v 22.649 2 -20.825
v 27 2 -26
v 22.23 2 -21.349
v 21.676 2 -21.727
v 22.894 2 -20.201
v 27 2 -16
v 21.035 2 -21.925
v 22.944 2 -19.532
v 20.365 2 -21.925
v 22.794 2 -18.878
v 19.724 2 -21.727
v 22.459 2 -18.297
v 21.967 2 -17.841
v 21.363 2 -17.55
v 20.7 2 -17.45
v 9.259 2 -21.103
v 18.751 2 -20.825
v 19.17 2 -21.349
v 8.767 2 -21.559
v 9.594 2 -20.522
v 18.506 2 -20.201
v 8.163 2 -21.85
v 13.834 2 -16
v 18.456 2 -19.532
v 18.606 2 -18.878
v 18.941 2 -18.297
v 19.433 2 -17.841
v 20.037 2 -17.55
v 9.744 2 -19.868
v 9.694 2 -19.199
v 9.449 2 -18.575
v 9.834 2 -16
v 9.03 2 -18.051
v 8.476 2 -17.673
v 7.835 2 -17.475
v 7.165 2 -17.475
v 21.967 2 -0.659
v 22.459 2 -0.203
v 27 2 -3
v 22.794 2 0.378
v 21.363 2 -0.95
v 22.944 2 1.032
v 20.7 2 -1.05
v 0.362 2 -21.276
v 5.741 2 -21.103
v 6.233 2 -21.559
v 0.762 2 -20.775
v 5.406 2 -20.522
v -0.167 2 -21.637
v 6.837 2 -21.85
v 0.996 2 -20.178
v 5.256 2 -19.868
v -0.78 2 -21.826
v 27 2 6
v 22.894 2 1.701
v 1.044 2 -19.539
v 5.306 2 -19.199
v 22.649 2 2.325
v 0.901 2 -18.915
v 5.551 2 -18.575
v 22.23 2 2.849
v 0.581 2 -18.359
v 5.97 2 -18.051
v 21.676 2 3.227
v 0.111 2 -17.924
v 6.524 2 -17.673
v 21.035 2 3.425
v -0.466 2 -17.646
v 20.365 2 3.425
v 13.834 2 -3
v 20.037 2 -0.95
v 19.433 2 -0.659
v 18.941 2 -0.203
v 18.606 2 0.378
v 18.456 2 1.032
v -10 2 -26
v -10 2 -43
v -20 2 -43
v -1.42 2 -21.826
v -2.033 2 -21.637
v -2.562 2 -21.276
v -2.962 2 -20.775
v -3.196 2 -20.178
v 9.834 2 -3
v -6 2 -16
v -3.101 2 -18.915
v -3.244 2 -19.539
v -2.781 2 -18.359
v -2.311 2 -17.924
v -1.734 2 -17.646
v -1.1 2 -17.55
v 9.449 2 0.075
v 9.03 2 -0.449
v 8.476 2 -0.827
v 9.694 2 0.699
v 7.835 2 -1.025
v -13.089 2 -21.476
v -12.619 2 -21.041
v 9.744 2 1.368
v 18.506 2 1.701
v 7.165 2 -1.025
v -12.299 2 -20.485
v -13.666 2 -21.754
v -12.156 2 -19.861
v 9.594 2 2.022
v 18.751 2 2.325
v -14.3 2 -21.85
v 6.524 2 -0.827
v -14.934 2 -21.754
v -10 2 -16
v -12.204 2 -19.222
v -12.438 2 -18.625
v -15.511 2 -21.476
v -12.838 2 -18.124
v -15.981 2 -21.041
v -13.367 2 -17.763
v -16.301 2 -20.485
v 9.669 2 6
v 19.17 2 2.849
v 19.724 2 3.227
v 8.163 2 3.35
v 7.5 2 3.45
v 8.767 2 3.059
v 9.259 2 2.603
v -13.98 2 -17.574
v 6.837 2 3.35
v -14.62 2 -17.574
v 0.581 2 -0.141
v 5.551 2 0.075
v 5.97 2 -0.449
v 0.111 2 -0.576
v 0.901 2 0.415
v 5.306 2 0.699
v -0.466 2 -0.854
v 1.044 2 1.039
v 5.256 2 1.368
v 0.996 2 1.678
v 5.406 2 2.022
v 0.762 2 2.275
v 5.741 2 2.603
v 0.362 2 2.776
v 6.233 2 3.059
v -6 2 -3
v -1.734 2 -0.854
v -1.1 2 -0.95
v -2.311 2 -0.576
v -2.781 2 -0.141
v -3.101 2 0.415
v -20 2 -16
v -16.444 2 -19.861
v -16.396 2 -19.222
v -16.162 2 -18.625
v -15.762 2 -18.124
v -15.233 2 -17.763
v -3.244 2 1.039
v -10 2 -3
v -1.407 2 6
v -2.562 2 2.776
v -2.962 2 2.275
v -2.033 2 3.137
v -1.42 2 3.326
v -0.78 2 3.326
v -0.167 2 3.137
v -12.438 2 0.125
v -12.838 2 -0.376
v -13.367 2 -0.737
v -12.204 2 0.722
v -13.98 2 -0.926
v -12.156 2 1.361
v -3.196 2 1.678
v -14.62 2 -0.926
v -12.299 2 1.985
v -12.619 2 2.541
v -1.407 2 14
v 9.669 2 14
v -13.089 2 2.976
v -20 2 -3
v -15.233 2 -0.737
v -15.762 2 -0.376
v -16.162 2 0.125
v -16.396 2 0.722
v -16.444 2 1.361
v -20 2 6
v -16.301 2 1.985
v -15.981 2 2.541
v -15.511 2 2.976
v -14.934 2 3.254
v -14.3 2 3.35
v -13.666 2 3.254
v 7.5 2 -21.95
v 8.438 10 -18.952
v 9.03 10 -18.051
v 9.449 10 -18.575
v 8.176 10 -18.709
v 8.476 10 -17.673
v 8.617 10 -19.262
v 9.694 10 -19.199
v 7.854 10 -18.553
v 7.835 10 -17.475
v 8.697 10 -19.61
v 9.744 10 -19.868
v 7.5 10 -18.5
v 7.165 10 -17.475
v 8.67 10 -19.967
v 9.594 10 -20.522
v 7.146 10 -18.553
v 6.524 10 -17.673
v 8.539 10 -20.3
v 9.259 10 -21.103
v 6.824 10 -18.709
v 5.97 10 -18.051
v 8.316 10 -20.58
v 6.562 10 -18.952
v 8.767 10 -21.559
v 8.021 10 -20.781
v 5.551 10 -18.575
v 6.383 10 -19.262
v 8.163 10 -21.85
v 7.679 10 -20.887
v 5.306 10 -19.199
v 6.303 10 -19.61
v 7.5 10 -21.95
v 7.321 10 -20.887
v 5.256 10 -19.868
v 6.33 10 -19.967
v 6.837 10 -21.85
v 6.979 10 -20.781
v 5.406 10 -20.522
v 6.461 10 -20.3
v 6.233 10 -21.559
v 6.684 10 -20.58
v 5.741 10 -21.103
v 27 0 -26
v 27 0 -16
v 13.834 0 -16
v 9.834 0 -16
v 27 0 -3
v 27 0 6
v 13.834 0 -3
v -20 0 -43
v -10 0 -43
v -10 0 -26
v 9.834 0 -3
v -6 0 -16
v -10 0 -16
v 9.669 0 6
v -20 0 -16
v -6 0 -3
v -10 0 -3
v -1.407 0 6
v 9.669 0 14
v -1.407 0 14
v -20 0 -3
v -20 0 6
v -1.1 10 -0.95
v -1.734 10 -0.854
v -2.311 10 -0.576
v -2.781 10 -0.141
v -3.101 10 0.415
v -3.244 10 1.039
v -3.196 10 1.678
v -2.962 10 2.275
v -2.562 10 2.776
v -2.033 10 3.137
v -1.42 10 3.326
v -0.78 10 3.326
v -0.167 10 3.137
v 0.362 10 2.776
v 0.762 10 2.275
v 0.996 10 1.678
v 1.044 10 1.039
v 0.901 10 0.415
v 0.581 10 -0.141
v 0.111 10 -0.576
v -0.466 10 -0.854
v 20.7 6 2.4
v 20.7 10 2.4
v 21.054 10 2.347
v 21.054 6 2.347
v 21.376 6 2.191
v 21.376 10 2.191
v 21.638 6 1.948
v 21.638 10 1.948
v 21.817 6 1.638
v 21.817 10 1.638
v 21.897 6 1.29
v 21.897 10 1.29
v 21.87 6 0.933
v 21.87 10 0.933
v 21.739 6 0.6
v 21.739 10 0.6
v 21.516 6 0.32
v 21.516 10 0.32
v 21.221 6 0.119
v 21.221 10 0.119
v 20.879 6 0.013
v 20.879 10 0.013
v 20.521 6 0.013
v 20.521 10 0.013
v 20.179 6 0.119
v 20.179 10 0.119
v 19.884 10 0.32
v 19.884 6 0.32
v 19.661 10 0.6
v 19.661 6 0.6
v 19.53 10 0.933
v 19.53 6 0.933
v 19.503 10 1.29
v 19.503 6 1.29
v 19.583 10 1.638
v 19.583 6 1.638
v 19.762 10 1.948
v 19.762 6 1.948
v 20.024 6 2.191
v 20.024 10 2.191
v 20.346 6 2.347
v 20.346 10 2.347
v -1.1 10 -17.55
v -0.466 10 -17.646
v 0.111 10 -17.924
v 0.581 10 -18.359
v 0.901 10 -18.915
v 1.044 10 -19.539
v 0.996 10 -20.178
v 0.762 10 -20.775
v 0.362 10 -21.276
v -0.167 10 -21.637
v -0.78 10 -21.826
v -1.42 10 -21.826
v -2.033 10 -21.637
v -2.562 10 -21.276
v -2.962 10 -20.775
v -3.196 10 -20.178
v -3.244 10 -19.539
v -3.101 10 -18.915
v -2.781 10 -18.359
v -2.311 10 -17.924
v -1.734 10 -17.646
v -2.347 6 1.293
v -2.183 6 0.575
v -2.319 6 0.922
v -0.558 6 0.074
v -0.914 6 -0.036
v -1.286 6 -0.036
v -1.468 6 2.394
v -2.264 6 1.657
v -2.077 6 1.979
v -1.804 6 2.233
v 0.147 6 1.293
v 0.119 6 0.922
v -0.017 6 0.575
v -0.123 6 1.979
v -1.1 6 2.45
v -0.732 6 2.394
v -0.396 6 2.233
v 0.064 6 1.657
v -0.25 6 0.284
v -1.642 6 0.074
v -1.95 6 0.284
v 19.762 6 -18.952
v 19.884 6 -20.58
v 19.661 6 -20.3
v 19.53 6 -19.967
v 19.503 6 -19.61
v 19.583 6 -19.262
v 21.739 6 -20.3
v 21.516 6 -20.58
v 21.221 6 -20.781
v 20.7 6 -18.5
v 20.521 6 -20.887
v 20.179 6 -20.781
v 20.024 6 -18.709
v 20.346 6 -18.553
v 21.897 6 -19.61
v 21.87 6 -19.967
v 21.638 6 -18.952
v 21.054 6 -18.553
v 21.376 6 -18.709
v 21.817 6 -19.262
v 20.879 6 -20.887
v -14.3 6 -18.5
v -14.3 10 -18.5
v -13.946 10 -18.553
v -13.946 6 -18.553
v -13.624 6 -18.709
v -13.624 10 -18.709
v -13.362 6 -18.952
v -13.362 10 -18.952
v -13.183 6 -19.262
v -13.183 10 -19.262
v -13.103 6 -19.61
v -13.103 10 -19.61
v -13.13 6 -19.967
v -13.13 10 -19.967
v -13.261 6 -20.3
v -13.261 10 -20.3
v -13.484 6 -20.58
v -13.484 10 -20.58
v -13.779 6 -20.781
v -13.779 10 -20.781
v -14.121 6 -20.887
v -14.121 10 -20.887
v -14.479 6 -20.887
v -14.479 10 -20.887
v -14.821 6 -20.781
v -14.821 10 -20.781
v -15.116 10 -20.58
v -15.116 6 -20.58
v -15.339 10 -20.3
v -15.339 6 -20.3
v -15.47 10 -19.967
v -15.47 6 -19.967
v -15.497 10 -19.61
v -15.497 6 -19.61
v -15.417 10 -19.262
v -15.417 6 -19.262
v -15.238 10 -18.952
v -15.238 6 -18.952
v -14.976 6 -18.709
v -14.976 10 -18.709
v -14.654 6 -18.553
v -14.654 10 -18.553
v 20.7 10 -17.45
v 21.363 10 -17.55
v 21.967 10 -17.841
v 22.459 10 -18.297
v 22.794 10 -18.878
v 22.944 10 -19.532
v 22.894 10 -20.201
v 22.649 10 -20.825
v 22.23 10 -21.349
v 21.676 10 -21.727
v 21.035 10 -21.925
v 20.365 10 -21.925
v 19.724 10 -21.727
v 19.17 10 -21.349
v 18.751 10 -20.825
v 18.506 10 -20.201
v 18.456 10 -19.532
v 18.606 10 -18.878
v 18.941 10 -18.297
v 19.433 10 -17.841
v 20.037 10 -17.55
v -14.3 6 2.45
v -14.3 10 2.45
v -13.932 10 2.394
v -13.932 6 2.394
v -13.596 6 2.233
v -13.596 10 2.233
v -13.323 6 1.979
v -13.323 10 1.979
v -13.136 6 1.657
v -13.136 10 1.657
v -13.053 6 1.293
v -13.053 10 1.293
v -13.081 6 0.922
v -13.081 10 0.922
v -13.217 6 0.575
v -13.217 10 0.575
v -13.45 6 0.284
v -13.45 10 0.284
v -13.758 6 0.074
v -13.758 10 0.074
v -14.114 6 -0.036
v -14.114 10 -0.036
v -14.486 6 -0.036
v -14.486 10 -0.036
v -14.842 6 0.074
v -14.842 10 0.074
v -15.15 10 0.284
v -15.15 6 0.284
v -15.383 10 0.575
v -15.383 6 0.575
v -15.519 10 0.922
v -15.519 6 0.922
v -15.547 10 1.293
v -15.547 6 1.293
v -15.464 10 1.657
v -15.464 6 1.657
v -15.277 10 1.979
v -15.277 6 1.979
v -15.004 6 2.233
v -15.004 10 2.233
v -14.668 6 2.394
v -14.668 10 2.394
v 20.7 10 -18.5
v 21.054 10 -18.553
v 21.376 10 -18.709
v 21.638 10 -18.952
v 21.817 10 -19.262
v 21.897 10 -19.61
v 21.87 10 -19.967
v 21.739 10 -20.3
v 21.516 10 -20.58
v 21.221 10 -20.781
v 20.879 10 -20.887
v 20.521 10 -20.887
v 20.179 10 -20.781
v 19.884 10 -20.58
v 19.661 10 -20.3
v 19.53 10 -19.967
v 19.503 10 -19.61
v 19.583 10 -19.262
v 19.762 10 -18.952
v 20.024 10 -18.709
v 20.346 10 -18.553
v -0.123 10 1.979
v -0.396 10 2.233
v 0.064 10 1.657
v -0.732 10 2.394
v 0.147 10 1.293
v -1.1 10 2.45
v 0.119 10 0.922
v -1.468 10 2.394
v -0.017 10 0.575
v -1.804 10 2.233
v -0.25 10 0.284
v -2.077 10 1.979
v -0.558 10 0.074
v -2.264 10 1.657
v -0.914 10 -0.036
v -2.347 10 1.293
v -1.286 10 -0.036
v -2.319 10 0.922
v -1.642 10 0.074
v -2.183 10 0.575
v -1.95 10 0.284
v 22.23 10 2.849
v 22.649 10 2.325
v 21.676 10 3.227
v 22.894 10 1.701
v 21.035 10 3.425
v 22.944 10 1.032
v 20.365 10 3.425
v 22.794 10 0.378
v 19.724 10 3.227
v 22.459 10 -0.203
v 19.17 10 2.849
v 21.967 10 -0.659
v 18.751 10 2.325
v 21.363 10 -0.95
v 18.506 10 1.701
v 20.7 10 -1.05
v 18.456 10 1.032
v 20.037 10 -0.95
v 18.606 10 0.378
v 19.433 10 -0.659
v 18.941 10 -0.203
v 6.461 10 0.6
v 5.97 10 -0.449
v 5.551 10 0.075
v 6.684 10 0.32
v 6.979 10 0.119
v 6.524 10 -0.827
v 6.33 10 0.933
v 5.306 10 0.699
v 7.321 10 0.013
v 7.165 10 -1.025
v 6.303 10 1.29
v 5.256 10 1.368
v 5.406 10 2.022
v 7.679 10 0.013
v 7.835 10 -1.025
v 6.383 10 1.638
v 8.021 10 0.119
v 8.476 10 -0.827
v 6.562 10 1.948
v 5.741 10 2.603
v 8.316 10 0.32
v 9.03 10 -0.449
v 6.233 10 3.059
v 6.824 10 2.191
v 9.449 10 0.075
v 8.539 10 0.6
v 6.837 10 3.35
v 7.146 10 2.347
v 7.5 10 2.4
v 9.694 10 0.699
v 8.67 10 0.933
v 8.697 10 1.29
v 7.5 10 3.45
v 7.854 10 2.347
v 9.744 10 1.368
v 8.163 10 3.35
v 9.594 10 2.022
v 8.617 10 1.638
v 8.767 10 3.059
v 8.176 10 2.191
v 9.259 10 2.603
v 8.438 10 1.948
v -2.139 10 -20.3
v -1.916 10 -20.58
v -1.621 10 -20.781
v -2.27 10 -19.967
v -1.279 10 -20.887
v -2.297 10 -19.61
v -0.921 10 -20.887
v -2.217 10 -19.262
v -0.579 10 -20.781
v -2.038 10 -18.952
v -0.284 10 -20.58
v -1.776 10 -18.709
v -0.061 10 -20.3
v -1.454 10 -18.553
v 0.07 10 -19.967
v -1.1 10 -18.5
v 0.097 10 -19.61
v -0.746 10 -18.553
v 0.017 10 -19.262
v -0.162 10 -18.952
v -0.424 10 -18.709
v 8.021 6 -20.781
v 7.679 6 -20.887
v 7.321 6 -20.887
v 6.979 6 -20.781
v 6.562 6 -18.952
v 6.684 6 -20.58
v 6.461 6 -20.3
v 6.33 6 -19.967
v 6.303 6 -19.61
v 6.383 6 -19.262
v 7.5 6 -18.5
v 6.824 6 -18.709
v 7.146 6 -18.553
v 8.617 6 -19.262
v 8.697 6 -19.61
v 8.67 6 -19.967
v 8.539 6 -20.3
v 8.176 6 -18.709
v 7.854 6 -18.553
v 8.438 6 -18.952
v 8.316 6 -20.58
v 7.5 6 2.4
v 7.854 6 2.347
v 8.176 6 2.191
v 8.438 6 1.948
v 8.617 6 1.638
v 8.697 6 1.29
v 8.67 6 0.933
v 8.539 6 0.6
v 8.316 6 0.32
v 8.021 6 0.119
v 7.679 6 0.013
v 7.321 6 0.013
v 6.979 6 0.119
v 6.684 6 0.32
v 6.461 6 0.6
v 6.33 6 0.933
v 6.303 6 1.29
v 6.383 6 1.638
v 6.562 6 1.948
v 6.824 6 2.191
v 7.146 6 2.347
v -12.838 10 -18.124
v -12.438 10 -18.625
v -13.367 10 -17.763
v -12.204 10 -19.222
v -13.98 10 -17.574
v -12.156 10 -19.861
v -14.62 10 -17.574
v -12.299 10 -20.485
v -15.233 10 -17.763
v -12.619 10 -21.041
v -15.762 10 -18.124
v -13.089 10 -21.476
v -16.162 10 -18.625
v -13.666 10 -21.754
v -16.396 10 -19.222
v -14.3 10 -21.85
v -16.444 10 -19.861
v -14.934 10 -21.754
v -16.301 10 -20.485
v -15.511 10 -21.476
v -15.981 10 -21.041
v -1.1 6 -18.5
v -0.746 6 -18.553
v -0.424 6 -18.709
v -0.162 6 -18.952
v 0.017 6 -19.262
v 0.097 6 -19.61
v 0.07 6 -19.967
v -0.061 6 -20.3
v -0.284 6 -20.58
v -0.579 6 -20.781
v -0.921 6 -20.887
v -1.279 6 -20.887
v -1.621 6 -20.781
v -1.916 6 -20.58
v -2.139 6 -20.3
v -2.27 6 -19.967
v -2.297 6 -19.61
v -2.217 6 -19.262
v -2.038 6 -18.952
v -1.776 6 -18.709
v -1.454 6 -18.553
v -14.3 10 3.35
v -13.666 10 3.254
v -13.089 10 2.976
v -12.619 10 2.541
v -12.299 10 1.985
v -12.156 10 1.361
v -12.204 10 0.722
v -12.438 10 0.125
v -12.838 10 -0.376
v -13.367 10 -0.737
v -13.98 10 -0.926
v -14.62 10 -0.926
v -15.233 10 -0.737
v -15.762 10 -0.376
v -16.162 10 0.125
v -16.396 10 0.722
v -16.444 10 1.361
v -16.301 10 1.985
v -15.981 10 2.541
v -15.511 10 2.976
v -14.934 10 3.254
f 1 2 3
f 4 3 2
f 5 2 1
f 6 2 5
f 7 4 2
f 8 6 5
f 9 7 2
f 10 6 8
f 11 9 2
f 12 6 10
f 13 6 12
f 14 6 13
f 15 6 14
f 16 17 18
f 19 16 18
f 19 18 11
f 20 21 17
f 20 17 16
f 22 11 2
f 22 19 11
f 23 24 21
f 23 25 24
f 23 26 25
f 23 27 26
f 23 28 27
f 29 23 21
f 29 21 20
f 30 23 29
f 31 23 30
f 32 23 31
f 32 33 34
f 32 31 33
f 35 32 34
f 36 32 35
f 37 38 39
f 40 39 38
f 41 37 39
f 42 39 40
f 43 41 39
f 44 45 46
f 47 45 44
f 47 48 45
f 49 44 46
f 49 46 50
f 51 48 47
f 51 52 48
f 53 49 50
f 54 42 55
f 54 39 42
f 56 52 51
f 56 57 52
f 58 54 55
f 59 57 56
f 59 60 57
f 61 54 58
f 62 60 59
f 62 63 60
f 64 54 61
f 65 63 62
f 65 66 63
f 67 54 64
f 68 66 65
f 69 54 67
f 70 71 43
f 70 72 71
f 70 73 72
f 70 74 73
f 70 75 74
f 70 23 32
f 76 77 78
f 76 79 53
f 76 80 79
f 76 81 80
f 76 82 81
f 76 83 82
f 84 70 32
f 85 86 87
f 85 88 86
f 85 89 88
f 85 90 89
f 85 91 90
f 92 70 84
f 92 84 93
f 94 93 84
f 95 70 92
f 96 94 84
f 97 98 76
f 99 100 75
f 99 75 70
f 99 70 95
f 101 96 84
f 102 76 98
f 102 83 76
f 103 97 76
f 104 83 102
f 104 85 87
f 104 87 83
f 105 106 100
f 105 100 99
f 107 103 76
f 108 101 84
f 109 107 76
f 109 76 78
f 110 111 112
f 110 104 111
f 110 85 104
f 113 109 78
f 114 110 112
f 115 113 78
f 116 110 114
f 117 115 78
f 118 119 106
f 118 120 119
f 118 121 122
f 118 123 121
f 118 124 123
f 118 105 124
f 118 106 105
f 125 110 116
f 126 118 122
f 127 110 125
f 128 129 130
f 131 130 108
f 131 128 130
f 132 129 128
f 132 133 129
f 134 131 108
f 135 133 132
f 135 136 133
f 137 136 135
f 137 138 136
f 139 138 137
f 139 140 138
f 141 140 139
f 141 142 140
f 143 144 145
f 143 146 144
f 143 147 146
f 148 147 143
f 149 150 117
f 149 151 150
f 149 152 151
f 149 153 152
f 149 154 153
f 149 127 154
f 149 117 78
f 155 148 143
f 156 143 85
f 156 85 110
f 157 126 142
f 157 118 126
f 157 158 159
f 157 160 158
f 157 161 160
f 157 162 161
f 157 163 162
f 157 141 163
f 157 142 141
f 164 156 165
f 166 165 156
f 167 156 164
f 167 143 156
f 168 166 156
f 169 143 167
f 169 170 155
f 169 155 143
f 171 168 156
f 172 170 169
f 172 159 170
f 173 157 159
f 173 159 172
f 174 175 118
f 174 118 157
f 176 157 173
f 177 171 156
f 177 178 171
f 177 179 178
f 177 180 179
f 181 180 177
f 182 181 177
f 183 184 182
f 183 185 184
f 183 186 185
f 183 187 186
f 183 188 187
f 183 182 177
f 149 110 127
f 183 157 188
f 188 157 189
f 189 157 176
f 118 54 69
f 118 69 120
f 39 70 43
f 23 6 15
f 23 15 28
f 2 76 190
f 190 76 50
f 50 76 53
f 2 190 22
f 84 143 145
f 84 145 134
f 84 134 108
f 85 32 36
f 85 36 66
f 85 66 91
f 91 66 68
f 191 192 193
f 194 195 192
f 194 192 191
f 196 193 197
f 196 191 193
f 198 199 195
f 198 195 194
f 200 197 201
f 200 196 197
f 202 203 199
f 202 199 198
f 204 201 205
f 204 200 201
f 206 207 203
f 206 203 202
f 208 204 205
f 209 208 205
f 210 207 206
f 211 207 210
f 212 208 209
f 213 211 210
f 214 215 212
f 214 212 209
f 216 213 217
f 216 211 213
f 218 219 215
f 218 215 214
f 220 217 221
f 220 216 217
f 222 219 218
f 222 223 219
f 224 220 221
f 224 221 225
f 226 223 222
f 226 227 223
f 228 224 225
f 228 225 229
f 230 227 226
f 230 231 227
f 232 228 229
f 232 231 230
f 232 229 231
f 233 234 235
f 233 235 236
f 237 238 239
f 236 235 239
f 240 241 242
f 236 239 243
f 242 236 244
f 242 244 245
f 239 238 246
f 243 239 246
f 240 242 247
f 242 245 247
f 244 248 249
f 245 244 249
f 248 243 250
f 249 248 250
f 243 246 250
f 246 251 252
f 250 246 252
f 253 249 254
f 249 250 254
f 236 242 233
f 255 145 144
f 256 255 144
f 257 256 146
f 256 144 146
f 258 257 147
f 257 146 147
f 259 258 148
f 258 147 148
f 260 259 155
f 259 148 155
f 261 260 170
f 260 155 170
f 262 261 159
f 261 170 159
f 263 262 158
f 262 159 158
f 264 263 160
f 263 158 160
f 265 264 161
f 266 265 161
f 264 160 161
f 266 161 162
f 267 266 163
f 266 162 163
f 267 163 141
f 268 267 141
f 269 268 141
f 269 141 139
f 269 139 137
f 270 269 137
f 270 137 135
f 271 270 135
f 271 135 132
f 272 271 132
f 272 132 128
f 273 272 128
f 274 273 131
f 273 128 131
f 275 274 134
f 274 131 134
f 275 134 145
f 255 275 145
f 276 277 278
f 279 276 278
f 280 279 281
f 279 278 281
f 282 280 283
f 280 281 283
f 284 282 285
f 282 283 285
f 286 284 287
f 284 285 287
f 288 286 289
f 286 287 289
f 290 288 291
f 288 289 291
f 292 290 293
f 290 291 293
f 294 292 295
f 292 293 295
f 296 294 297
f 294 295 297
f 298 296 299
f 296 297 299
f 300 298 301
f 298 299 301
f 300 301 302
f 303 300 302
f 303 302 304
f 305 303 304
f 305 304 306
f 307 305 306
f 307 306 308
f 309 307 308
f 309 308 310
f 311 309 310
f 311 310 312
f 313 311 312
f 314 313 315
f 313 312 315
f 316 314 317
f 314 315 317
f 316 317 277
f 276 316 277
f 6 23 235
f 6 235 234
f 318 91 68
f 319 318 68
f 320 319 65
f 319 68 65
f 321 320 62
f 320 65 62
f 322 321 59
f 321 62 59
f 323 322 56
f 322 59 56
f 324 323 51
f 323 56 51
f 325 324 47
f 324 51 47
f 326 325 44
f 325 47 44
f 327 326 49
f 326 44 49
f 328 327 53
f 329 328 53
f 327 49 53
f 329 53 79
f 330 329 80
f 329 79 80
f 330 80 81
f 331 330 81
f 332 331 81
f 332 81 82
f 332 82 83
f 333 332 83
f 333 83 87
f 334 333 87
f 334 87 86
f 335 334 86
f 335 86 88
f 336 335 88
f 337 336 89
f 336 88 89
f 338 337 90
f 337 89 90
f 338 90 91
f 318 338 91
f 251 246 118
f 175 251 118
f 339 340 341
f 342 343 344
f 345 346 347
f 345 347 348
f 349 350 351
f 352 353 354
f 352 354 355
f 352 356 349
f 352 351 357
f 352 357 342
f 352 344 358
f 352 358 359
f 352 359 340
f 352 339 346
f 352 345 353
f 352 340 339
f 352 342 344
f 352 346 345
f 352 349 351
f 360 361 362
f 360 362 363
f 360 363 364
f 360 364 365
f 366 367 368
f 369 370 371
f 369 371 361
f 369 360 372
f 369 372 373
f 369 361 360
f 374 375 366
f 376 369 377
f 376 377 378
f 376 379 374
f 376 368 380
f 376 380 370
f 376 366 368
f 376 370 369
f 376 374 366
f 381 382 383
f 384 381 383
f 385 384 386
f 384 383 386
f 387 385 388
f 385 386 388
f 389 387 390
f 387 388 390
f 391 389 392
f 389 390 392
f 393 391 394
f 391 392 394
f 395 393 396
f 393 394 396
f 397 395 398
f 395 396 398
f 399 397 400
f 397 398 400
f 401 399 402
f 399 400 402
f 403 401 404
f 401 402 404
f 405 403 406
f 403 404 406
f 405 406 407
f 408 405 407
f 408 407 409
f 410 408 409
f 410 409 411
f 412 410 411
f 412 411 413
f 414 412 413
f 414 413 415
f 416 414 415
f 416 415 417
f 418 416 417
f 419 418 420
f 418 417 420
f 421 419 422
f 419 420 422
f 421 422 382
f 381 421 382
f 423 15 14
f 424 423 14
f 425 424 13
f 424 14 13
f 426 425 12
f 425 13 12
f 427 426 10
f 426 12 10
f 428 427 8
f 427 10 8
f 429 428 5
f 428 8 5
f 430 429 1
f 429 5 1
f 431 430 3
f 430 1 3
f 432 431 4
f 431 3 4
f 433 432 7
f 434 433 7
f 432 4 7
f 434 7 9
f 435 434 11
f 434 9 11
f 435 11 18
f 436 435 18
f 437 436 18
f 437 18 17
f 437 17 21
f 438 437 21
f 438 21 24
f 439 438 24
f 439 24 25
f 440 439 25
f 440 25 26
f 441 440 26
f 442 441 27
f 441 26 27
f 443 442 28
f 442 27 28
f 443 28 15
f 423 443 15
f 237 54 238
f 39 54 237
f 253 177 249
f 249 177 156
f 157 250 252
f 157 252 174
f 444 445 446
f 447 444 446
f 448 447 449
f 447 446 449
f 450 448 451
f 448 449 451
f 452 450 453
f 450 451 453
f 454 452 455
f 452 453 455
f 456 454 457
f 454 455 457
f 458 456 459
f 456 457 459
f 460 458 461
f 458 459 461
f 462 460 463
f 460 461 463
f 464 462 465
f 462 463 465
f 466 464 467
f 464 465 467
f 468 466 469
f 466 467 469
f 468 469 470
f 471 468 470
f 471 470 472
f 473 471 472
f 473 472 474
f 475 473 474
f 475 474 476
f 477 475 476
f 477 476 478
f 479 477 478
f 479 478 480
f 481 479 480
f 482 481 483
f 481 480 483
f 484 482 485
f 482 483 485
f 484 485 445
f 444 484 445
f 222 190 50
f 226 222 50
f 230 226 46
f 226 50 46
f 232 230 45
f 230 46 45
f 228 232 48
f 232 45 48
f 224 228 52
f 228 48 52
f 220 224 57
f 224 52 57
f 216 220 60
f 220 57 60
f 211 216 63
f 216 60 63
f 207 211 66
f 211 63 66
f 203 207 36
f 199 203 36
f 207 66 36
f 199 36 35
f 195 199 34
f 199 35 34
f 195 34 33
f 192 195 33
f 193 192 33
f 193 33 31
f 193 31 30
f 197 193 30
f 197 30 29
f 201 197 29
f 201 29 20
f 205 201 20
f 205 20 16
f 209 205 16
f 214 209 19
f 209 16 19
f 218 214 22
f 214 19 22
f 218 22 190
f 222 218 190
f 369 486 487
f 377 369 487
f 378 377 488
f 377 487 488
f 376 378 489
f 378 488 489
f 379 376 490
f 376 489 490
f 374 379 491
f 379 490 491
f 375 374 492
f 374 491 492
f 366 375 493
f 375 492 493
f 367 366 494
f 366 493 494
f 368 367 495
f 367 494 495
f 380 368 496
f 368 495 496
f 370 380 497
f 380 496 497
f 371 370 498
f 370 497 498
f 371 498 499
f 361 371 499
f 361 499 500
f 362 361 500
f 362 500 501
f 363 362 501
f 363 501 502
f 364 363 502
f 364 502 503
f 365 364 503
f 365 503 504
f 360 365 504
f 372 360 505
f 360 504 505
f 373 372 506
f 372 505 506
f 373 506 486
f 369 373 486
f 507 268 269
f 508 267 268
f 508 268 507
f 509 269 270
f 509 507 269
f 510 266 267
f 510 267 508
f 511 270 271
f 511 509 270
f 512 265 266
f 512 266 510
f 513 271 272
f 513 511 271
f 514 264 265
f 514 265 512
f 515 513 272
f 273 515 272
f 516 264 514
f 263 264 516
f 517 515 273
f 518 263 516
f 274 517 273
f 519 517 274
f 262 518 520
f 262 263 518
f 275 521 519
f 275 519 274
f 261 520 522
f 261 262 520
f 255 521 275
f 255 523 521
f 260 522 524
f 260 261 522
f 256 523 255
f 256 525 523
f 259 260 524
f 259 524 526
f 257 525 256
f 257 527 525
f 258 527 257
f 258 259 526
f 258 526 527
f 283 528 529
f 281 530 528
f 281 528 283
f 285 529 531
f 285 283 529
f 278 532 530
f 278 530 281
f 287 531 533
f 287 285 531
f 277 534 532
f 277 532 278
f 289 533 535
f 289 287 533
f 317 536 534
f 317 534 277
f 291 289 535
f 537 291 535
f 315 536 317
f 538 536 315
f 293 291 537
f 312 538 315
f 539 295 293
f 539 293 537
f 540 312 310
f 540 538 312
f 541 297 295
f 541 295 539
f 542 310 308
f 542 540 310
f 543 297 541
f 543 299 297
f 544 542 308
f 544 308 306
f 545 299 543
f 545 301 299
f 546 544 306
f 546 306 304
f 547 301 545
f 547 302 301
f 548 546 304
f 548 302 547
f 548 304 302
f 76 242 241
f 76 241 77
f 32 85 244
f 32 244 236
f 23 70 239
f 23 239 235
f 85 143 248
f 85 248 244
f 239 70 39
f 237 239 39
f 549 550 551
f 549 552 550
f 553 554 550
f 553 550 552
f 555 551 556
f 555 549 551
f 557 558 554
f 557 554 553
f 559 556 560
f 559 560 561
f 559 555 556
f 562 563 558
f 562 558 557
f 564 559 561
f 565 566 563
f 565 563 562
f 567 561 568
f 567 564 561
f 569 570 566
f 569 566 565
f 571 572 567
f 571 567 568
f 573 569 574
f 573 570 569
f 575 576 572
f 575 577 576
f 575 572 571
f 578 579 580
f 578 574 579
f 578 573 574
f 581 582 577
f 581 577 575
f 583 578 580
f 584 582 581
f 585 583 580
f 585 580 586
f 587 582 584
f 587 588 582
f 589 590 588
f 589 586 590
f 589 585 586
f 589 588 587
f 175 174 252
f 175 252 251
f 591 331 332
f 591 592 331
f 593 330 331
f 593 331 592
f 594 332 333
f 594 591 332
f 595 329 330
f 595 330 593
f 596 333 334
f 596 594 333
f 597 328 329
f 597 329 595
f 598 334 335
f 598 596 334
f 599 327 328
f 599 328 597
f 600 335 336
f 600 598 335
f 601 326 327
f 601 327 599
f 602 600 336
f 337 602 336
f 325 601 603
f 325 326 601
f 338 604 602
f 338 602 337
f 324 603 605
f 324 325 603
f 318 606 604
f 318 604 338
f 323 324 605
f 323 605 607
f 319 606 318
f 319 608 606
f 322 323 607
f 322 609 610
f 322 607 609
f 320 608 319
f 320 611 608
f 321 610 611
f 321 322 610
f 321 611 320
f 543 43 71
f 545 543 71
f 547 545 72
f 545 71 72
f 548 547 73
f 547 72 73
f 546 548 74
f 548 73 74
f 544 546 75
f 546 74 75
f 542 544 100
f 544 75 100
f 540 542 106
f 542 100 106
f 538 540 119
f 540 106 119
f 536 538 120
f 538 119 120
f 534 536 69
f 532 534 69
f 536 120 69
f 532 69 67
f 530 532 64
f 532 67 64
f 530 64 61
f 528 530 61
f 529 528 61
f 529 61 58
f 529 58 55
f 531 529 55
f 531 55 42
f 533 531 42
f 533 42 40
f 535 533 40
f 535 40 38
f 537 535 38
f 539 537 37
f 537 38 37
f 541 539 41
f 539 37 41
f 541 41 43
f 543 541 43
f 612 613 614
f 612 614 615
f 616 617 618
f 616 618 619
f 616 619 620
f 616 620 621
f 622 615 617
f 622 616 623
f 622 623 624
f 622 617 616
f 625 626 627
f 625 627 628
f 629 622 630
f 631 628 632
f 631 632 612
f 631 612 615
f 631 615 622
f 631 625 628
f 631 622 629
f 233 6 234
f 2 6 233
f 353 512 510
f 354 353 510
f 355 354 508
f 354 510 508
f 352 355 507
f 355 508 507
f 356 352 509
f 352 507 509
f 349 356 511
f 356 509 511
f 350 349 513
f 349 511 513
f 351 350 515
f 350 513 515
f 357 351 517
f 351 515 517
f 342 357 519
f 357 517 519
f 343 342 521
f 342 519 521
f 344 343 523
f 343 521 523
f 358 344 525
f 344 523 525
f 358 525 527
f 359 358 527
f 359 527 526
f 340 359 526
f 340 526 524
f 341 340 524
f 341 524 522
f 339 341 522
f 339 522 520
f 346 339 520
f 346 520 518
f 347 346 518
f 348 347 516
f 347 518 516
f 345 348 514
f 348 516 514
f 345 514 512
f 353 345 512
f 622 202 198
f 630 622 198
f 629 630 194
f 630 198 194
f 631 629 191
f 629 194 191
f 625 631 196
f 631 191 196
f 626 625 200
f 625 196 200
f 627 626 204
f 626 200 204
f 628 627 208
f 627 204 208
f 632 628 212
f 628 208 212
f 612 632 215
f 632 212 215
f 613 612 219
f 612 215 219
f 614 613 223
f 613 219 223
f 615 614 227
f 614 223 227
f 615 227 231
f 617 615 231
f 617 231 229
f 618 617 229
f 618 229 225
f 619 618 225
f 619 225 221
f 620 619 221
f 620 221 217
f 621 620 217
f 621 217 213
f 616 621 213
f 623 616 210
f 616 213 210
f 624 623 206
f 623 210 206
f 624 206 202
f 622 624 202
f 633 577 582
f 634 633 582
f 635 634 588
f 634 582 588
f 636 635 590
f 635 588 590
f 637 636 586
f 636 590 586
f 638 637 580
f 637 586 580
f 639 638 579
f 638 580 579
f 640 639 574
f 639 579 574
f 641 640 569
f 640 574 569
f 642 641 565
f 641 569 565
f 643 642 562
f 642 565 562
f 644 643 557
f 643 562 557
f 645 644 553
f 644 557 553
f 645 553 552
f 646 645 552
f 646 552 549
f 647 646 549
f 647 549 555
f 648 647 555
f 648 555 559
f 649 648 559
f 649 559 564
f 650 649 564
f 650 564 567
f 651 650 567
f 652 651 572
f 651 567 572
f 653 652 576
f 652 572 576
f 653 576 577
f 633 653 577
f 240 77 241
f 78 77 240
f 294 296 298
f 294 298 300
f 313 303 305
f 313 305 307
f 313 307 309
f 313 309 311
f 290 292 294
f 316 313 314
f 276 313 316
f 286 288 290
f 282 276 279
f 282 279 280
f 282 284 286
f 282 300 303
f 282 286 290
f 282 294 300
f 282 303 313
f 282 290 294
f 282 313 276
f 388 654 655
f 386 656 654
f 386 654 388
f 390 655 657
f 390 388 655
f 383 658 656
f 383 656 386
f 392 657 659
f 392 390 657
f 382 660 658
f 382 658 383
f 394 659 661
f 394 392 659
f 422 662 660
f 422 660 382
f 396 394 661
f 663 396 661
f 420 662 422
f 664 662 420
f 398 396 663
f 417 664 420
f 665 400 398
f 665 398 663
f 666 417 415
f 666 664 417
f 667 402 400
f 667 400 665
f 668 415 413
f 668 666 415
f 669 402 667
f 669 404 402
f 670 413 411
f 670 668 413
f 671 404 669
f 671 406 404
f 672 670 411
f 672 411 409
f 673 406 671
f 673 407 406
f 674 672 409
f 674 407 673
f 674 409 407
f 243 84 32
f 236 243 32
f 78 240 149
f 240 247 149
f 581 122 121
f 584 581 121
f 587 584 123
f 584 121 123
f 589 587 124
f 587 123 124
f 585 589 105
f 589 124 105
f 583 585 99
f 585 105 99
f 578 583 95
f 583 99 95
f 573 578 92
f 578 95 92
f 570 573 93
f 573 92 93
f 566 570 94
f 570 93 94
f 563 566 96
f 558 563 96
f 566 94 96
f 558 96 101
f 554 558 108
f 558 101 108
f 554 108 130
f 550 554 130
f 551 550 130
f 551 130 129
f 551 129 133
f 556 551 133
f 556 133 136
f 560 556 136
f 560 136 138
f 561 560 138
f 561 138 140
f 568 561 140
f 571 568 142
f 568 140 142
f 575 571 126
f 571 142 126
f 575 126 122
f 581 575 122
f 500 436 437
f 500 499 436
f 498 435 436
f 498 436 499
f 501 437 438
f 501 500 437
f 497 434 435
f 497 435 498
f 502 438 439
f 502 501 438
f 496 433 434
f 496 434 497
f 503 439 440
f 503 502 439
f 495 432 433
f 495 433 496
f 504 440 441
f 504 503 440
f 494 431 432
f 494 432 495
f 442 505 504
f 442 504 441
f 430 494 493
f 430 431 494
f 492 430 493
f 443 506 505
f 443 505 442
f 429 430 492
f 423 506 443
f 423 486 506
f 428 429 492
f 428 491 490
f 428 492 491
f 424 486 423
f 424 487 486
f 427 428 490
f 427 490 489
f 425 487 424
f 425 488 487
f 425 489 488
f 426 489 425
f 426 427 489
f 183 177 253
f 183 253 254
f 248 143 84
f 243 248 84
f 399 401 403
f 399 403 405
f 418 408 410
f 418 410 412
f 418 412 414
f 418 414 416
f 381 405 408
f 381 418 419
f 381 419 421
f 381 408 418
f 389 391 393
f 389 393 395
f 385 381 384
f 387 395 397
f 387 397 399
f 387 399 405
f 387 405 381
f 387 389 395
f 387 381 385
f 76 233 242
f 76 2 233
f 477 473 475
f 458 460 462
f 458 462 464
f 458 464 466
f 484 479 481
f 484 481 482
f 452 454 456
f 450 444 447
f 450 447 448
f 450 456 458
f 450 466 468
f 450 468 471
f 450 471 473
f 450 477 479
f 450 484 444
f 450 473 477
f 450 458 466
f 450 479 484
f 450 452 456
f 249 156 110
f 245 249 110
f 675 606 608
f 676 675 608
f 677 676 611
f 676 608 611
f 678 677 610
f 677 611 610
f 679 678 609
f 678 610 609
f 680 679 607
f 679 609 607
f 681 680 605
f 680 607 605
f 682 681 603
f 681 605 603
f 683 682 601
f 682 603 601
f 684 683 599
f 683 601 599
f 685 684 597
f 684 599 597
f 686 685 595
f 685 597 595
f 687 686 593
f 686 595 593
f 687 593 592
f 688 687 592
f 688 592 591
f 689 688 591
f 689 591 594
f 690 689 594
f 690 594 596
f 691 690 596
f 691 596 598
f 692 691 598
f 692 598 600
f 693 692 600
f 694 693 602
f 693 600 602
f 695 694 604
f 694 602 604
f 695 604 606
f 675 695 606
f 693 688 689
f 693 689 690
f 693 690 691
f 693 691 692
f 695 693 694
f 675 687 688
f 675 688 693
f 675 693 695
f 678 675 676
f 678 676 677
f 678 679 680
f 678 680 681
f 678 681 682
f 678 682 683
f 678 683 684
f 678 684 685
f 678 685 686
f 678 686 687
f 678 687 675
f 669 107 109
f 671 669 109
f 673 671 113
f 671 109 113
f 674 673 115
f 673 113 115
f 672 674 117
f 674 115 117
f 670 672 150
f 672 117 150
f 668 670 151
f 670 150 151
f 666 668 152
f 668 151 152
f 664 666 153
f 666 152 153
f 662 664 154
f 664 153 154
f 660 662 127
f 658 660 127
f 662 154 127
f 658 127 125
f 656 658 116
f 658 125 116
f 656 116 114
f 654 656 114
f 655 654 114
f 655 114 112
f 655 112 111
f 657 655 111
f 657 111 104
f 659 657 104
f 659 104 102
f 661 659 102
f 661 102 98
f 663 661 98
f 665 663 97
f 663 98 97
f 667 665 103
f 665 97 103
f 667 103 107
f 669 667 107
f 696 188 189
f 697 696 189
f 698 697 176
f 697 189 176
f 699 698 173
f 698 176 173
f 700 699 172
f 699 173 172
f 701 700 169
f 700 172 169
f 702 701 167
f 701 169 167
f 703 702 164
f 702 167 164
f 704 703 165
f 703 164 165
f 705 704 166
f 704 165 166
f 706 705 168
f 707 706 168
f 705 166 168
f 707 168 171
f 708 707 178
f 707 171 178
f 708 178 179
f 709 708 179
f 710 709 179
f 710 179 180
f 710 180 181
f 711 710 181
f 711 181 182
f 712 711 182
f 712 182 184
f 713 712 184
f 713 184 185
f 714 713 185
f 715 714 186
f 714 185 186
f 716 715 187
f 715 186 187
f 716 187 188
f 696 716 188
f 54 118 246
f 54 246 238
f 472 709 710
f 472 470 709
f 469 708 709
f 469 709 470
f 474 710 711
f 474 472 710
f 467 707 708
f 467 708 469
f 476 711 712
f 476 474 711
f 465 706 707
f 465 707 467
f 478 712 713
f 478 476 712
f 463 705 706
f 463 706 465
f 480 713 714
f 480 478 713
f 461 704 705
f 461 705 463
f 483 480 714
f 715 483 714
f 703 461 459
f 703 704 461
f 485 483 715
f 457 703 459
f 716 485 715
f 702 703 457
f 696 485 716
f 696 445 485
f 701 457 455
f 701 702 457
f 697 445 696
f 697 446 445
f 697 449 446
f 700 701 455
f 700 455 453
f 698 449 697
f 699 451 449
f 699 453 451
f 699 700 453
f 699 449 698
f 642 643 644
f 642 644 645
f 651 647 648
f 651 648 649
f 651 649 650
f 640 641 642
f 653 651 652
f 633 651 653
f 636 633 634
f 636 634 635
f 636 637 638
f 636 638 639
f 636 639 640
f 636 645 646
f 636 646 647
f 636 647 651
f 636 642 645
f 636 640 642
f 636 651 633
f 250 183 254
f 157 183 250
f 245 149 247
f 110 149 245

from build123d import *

# Parameters (mm, degrees)
SKETCH1_W               = 60
SKETCH1_H               = 72
BOTTOM_DEPTH            = 2
SKETCH2_R               = 2.25
PIN_LOCS_DEPTH          = 4
SKETCH5_R               = 1.25
PIN_HOLES_DEPTH         = 4
SKETCH3_R               = 2.25
SKETCH3_R_2             = 2.15
SENSOR_PINS_DEPTH       = 8
SKETCH6_R               = 1.25
SKETCH6_R_2             = 1.2
PIN_HOLES_SENSORS_DEPTH = 4
SKETCH4_W               = 8
SKETCH4_H               = 10
POWER_CABLE_DEPTH       = 2
SKETCH7_W               = 16.5
SKETCH7_H               = 25
SKETCH7_W_2             = 17
SKETCH7_H_2             = 13
SKETCH7_W_3             = 15.833991833
SKETCH7_W_4             = 13.166008167
SKETCH7_W_5             = 15.5
CUT_EXTRUDE1_DEPTH      = 2
SKETCH8_W               = 64.981954188
SKETCH8_H               = 18.550894708
CUT_EXTRUDE2_DEPTH      = 30
SKETCH9_W               = 66.656683173
SKETCH9_H               = 21.371664799
CUT_EXTRUDE3_DEPTH      = 10
SKETCH10_W              = 36.941564119
SKETCH10_H              = 17.072061012
CUT_EXTRUDE4_DEPTH      = 10
SKETCH12_W              = 38.10862574
SKETCH12_H              = 18.099687976
CUT_EXTRUDE5_DEPTH      = 3
SKETCH13_W              = 10
SKETCH13_H              = 2
BOSS_EXTRUDE1_DEPTH     = 17
SKETCH14_W              = 11.076631965
SKETCH14_H              = 2
BOSS_EXTRUDE2_DEPTH     = 8


with BuildPart() as part:
    # Sketch1 → Bottom (new body)
    with BuildSketch(Plane(origin=(0, 0, 0), x_dir=(1, 0, 0), z_dir=(0, 1, 0))):
        Rectangle(SKETCH1_W, SKETCH1_H)
    extrude(amount=BOTTOM_DEPTH)

    # Sketch2 → Pin Locs (add)
    with BuildSketch(Plane(origin=(0, 2, 0), x_dir=(1, 0, 0), z_dir=(0, 1, 0))):
        with Locations(Location((25.7, -13.1, 0), (0, 0, 90))):
            Circle(SKETCH2_R)
        with Locations(Location((-20.7, -13.1, 0), (0, 0, 270))):
            Circle(SKETCH2_R)
        with Locations(Location((25.7, -31.5, 0), (0, 0, 270))):
            Circle(SKETCH2_R)
        with Locations(Location((-20.7, -31.5, 0), (0, 0, 90))):
            Circle(SKETCH2_R)
    extrude(amount=PIN_LOCS_DEPTH)

    # Sketch5 → Pin Holes (cut)
    with BuildSketch(Plane(origin=(0, 6, 0), x_dir=(1, 0, 0), z_dir=(0, 1, 0))):
        with Locations(Location((-20.7, -31.5, 0), (0, 0, 270))):
            Circle(SKETCH5_R)
        with Locations(Location((-20.7, -13.1, 0), (0, 0, 270))):
            Circle(SKETCH5_R)
        with Locations(Location((25.7, -13.1, 0), (0, 0, 270))):
            Circle(SKETCH5_R)
        with Locations(Location((25.7, -31.5, 0), (0, 0, 270))):
            Circle(SKETCH5_R)
    extrude(amount=-PIN_HOLES_DEPTH, mode=Mode.SUBTRACT)

    # Sketch3 → Sensor Pins (add)
    with BuildSketch(Plane(origin=(0, 2, 0), x_dir=(1, 0, 0), z_dir=(0, 1, 0))):
        with Locations(Location((20.7, 19.7, 0), (0, 0, 270))):
            Circle(SKETCH3_R)
        with Locations(Location((20.7, -1.2, 0), (0, 0, 90))):
            Circle(SKETCH3_R)
        with Locations(Location((7.5, -1.2, 0), (0, 0, 270))):
            Circle(SKETCH3_R)
        with Locations(Location((7.5, 19.7, 0), (0, 0, 90))):
            Circle(SKETCH3_R)
        with Locations(Location((-1.1, 19.7, 0), (0, 0, 270))):
            Circle(SKETCH3_R_2)
        with Locations(Location((-1.1, -1.2, 0), (0, 0, 90))):
            Circle(SKETCH3_R_2)
        with Locations(Location((-14.3, -1.2, 0), (0, 0, 270))):
            Circle(SKETCH3_R_2)
        with Locations(Location((-14.3, 19.7, 0), (0, 0, 90))):
            Circle(SKETCH3_R_2)
    extrude(amount=SENSOR_PINS_DEPTH)

    # Sketch6 → Pin Holes Sensors (cut)
    with BuildSketch(Plane(origin=(0, 10, 0), x_dir=(1, 0, 0), z_dir=(0, 1, 0))):
        with Locations(Location((-14.3, -1.2, 0), (0, 0, 270))):
            Circle(SKETCH6_R)
        with Locations(Location((-1.1, -1.2, 0), (0, 0, 270))):
            Circle(SKETCH6_R)
        with Locations(Location((-1.1, 19.7, 0), (0, 0, 270))):
            Circle(SKETCH6_R_2)
        with Locations(Location((-14.3, 19.7, 0), (0, 0, 270))):
            Circle(SKETCH6_R_2)
        with Locations(Location((20.7, -1.2, 0), (0, 0, 270))):
            Circle(SKETCH6_R_2)
        with Locations(Location((20.7, 19.7, 0), (0, 0, 270))):
            Circle(SKETCH6_R_2)
        with Locations(Location((7.5, 19.7, 0), (0, 0, 270))):
            Circle(SKETCH6_R_2)
        with Locations(Location((7.5, -1.2, 0), (0, 0, 270))):
            Circle(SKETCH6_R_2)
    extrude(amount=-PIN_HOLES_SENSORS_DEPTH, mode=Mode.SUBTRACT)

    # Sketch4 → Power Cable (cut)
    with BuildSketch(Plane(origin=(0, 2, 0), x_dir=(1, 0, 0), z_dir=(0, 1, 0))):
        with Locations((26, 31)):
            Rectangle(SKETCH4_W, SKETCH4_H)
    extrude(amount=-POWER_CABLE_DEPTH, mode=Mode.SUBTRACT)

    # Sketch7 → Cut-Extrude1 (cut)
    with BuildSketch(Plane(origin=(0, 2, 0), x_dir=(1, 0, 0), z_dir=(0, 1, 0))):
        with Locations((-7.75, -20.5)):
            Rectangle(SKETCH7_W, SKETCH7_H)
        with Locations((-18.5, 9.5)):
            Rectangle(SKETCH7_W_2, SKETCH7_H_2)
        with Locations((1.916995917, 9.5)):
            Rectangle(SKETCH7_W_3, SKETCH7_H_2)
        with Locations((20.416995916, 9.5)):
            Rectangle(SKETCH7_W_4, SKETCH7_H_2)
        with Locations((12.25, -20.5)):
            Rectangle(SKETCH7_W_5, SKETCH7_H)
    extrude(amount=-CUT_EXTRUDE1_DEPTH, mode=Mode.SUBTRACT)

    # Sketch8 → Cut-Extrude2 (cut)
    with BuildSketch(Plane.XY.offset(36)):
        with Locations((-0.087810816, 5.992805319)):
            Rectangle(SKETCH8_W, SKETCH8_H)
    extrude(amount=-CUT_EXTRUDE2_DEPTH, mode=Mode.SUBTRACT)

    # Sketch9 → Cut-Extrude3 (cut)
    with BuildSketch(Plane(origin=(0, 0, -36), x_dir=(-1, 0, 0), z_dir=(0, 0, -1))):
        with Locations((-0.680170236, 4.633119296)):
            Rectangle(SKETCH9_W, SKETCH9_H)
    extrude(amount=-CUT_EXTRUDE3_DEPTH, mode=Mode.SUBTRACT)

    # Sketch10 → Cut-Extrude4 (cut)
    with BuildSketch(Plane.ZY.offset(30)):
        with Locations((-9.291501149, 5.008650235)):
            Rectangle(SKETCH10_W, SKETCH10_H)
    extrude(amount=-CUT_EXTRUDE4_DEPTH, mode=Mode.SUBTRACT)

    # Sketch12 → Cut-Extrude5 (cut)
    with BuildSketch(Plane(origin=(30, 0, 0), x_dir=(0, 0, -1), z_dir=(1, 0, 0))):
        with Locations((8.949912617, 4.668826375)):
            Rectangle(SKETCH12_W, SKETCH12_H)
    extrude(amount=-CUT_EXTRUDE5_DEPTH, mode=Mode.SUBTRACT)

    # Sketch13 → Boss-Extrude1 (add)
    with BuildSketch(Plane(origin=(0, 0, -26), x_dir=(-1, 0, 0), z_dir=(0, 0, -1))):
        with Locations((15, 1)):
            Rectangle(SKETCH13_W, SKETCH13_H)
    extrude(amount=BOSS_EXTRUDE1_DEPTH)

    # Sketch14 → Boss-Extrude2 (add)
    with BuildSketch(Plane.XY.offset(6)):
        with Locations((4.13094739, 1)):
            Rectangle(SKETCH14_W, SKETCH14_H)
    extrude(amount=BOSS_EXTRUDE2_DEPTH)


solid = part.part
